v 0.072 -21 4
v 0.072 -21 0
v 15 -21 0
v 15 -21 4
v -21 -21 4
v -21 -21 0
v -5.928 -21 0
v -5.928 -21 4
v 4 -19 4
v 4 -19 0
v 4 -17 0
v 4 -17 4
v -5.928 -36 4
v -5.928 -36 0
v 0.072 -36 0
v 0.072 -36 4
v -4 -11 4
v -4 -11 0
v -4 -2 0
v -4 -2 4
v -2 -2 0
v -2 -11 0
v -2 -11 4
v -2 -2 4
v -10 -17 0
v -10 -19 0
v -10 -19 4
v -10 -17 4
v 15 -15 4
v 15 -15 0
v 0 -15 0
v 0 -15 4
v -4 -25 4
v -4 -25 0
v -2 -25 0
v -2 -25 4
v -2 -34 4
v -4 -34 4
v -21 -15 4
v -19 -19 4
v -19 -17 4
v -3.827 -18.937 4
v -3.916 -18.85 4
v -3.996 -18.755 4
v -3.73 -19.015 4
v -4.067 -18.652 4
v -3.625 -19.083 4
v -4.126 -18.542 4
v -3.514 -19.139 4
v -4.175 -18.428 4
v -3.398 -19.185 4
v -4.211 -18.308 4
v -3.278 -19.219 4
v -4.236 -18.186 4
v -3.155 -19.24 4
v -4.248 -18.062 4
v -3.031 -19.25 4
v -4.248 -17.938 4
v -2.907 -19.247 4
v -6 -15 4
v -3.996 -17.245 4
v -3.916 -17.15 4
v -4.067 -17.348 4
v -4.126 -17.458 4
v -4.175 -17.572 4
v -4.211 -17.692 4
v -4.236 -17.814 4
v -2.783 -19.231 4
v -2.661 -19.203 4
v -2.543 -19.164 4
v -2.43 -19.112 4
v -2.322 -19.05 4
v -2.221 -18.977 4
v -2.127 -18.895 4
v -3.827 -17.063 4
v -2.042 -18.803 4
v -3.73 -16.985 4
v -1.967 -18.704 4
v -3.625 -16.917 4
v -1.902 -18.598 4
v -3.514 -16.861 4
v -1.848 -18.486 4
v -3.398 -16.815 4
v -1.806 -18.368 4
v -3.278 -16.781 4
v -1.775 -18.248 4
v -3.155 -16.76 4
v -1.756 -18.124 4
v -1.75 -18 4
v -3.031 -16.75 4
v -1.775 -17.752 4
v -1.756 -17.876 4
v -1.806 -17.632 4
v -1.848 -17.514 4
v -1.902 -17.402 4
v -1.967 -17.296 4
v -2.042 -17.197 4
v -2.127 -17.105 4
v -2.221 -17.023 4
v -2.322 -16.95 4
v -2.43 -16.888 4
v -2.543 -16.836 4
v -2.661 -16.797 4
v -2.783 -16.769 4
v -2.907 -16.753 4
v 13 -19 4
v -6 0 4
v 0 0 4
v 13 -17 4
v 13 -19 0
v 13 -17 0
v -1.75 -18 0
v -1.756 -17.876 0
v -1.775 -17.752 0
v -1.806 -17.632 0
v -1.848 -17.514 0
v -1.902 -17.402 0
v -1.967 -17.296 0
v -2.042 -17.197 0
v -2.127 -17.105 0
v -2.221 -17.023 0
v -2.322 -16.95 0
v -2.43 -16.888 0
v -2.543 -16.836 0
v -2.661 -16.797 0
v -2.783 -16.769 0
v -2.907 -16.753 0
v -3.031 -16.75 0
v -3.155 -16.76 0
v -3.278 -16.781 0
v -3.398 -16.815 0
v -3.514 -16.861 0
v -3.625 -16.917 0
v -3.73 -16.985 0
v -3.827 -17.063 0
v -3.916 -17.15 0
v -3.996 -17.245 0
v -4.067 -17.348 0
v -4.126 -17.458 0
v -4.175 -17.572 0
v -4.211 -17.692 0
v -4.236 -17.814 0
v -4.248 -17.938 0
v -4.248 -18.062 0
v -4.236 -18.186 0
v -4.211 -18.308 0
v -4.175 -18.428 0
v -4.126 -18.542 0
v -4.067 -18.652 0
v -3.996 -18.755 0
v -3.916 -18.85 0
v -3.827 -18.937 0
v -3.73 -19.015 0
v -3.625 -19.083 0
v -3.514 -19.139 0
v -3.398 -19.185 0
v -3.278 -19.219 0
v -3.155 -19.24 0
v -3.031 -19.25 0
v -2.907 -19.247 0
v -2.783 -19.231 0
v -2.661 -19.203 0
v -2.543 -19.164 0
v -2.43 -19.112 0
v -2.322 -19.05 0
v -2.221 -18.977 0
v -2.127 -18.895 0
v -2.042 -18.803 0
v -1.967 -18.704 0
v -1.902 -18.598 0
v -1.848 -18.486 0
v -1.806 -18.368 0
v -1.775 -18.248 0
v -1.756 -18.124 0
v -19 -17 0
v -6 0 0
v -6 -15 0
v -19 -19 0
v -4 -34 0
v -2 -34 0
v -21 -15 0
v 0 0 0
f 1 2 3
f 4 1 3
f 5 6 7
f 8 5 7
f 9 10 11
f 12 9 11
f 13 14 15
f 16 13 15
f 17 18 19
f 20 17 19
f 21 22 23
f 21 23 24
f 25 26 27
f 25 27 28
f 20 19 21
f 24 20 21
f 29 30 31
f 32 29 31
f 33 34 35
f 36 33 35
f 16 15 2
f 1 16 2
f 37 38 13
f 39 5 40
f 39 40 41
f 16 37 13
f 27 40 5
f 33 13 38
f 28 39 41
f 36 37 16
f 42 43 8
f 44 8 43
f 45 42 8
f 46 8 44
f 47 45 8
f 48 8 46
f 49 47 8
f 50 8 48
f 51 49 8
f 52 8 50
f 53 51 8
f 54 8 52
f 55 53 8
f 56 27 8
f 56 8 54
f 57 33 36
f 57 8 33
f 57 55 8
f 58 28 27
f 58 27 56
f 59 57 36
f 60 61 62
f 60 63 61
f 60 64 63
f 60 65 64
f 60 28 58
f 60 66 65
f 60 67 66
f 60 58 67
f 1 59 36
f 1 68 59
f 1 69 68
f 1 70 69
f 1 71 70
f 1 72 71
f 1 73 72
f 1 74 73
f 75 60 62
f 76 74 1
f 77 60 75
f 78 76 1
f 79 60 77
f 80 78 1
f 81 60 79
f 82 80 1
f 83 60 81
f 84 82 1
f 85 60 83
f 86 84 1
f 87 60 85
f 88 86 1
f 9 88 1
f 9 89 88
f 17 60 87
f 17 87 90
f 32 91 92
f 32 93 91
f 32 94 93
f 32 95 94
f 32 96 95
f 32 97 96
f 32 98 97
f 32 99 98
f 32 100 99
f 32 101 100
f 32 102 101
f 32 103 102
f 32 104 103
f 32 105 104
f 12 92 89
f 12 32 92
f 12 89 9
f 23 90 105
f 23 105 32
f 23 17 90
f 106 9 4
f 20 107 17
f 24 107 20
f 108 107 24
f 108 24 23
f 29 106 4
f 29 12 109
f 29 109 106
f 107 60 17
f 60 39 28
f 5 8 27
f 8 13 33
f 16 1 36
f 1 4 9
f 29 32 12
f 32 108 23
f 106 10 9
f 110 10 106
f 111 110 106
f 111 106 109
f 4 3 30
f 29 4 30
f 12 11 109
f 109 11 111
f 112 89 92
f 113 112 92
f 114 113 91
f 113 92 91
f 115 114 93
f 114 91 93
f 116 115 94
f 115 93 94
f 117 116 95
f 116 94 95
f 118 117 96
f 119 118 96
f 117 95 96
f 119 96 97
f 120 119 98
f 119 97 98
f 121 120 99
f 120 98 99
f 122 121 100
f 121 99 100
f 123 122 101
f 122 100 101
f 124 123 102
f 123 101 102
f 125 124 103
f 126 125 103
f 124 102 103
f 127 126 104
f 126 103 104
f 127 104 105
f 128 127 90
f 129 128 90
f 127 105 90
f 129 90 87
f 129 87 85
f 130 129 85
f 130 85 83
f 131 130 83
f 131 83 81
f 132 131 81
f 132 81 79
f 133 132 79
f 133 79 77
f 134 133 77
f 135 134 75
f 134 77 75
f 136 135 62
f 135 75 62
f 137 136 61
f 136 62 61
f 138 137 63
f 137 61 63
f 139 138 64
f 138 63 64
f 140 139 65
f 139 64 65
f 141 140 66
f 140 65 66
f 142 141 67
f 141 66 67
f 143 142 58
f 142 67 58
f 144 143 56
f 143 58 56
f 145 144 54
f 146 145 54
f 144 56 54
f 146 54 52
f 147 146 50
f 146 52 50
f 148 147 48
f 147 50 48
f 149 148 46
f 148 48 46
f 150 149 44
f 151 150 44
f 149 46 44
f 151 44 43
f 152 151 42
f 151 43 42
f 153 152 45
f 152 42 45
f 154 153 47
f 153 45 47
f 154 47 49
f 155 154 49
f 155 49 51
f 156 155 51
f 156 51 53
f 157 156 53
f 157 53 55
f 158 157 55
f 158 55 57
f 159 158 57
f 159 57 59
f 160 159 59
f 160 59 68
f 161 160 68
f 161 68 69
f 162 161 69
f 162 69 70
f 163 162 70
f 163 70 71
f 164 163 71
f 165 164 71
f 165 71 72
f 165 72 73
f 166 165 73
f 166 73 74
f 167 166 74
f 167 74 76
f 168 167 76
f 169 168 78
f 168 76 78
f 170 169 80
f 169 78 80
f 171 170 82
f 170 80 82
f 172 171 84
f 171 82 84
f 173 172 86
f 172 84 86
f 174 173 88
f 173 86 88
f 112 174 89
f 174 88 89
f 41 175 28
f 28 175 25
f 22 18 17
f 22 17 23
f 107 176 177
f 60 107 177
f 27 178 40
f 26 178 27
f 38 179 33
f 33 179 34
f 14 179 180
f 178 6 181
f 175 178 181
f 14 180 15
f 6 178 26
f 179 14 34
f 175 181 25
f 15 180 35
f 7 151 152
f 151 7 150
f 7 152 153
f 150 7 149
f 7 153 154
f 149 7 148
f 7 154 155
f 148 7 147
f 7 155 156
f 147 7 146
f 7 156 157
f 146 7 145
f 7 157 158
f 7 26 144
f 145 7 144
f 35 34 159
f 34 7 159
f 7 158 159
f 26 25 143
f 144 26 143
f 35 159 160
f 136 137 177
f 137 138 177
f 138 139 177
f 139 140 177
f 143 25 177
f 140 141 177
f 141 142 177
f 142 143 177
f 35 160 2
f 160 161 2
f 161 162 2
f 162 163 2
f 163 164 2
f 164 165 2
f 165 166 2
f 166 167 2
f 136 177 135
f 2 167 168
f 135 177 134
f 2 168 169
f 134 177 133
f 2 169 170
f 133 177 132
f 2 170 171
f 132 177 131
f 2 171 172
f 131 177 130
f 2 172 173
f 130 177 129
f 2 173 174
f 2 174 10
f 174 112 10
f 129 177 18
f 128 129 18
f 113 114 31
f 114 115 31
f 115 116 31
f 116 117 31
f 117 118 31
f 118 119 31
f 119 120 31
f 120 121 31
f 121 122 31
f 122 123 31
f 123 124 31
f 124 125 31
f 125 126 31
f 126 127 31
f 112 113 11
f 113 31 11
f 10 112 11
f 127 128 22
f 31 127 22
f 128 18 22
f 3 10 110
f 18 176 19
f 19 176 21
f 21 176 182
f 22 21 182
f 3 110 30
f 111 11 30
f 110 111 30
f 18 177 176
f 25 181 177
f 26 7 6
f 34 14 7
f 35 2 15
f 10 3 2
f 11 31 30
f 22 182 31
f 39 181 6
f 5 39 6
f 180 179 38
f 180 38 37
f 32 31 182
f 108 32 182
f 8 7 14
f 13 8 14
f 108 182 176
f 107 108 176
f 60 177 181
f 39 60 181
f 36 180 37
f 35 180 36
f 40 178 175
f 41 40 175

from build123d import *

# Parameters (mm, degrees)
ESQUISSE1_W             = 2
ESQUISSE1_H             = 9
ESQUISSE1_W_2           = 9
ESQUISSE1_H_2           = 2
BOSS_EXTRU_4_DEPTH      = 4
ESQUISSE2_R             = 1.25
ENL_V_MAT_EXTRU_1_DEPTH = 4


with BuildPart() as part:
    # Esquisse1 → Boss.-Extru.4 (new body)
    with BuildSketch(Plane.XY):
        Polygon((0, 0), (-6, 0), (-6, -15), (-21, -15), (-21, -21), (-5.927854654, -21), (-5.927854654, -36), (0.072145346, -36), (0.072145346, -21), (15, -21), (15, -15), (0, -15), align=None)
        with Locations((-3, -6.5)):
            Rectangle(ESQUISSE1_W, ESQUISSE1_H, mode=Mode.SUBTRACT)
        with Locations((-14.5, -18)):
            Rectangle(ESQUISSE1_W_2, ESQUISSE1_H_2, mode=Mode.SUBTRACT)
        with Locations((-3, -29.5)):
            Rectangle(ESQUISSE1_W, ESQUISSE1_H, mode=Mode.SUBTRACT)
        with Locations((8.5, -18)):
            Rectangle(ESQUISSE1_W_2, ESQUISSE1_H_2, mode=Mode.SUBTRACT)
    extrude(amount=BOSS_EXTRU_4_DEPTH)

    # Esquisse2 → Enlèv. mat.-Extru.1 (cut)
    with BuildSketch(Plane.XY.offset(4)):
        with Locations((-3, -18)):
            Circle(ESQUISSE2_R)
    extrude(amount=-ENL_V_MAT_EXTRU_1_DEPTH, mode=Mode.SUBTRACT)


solid = part.part
